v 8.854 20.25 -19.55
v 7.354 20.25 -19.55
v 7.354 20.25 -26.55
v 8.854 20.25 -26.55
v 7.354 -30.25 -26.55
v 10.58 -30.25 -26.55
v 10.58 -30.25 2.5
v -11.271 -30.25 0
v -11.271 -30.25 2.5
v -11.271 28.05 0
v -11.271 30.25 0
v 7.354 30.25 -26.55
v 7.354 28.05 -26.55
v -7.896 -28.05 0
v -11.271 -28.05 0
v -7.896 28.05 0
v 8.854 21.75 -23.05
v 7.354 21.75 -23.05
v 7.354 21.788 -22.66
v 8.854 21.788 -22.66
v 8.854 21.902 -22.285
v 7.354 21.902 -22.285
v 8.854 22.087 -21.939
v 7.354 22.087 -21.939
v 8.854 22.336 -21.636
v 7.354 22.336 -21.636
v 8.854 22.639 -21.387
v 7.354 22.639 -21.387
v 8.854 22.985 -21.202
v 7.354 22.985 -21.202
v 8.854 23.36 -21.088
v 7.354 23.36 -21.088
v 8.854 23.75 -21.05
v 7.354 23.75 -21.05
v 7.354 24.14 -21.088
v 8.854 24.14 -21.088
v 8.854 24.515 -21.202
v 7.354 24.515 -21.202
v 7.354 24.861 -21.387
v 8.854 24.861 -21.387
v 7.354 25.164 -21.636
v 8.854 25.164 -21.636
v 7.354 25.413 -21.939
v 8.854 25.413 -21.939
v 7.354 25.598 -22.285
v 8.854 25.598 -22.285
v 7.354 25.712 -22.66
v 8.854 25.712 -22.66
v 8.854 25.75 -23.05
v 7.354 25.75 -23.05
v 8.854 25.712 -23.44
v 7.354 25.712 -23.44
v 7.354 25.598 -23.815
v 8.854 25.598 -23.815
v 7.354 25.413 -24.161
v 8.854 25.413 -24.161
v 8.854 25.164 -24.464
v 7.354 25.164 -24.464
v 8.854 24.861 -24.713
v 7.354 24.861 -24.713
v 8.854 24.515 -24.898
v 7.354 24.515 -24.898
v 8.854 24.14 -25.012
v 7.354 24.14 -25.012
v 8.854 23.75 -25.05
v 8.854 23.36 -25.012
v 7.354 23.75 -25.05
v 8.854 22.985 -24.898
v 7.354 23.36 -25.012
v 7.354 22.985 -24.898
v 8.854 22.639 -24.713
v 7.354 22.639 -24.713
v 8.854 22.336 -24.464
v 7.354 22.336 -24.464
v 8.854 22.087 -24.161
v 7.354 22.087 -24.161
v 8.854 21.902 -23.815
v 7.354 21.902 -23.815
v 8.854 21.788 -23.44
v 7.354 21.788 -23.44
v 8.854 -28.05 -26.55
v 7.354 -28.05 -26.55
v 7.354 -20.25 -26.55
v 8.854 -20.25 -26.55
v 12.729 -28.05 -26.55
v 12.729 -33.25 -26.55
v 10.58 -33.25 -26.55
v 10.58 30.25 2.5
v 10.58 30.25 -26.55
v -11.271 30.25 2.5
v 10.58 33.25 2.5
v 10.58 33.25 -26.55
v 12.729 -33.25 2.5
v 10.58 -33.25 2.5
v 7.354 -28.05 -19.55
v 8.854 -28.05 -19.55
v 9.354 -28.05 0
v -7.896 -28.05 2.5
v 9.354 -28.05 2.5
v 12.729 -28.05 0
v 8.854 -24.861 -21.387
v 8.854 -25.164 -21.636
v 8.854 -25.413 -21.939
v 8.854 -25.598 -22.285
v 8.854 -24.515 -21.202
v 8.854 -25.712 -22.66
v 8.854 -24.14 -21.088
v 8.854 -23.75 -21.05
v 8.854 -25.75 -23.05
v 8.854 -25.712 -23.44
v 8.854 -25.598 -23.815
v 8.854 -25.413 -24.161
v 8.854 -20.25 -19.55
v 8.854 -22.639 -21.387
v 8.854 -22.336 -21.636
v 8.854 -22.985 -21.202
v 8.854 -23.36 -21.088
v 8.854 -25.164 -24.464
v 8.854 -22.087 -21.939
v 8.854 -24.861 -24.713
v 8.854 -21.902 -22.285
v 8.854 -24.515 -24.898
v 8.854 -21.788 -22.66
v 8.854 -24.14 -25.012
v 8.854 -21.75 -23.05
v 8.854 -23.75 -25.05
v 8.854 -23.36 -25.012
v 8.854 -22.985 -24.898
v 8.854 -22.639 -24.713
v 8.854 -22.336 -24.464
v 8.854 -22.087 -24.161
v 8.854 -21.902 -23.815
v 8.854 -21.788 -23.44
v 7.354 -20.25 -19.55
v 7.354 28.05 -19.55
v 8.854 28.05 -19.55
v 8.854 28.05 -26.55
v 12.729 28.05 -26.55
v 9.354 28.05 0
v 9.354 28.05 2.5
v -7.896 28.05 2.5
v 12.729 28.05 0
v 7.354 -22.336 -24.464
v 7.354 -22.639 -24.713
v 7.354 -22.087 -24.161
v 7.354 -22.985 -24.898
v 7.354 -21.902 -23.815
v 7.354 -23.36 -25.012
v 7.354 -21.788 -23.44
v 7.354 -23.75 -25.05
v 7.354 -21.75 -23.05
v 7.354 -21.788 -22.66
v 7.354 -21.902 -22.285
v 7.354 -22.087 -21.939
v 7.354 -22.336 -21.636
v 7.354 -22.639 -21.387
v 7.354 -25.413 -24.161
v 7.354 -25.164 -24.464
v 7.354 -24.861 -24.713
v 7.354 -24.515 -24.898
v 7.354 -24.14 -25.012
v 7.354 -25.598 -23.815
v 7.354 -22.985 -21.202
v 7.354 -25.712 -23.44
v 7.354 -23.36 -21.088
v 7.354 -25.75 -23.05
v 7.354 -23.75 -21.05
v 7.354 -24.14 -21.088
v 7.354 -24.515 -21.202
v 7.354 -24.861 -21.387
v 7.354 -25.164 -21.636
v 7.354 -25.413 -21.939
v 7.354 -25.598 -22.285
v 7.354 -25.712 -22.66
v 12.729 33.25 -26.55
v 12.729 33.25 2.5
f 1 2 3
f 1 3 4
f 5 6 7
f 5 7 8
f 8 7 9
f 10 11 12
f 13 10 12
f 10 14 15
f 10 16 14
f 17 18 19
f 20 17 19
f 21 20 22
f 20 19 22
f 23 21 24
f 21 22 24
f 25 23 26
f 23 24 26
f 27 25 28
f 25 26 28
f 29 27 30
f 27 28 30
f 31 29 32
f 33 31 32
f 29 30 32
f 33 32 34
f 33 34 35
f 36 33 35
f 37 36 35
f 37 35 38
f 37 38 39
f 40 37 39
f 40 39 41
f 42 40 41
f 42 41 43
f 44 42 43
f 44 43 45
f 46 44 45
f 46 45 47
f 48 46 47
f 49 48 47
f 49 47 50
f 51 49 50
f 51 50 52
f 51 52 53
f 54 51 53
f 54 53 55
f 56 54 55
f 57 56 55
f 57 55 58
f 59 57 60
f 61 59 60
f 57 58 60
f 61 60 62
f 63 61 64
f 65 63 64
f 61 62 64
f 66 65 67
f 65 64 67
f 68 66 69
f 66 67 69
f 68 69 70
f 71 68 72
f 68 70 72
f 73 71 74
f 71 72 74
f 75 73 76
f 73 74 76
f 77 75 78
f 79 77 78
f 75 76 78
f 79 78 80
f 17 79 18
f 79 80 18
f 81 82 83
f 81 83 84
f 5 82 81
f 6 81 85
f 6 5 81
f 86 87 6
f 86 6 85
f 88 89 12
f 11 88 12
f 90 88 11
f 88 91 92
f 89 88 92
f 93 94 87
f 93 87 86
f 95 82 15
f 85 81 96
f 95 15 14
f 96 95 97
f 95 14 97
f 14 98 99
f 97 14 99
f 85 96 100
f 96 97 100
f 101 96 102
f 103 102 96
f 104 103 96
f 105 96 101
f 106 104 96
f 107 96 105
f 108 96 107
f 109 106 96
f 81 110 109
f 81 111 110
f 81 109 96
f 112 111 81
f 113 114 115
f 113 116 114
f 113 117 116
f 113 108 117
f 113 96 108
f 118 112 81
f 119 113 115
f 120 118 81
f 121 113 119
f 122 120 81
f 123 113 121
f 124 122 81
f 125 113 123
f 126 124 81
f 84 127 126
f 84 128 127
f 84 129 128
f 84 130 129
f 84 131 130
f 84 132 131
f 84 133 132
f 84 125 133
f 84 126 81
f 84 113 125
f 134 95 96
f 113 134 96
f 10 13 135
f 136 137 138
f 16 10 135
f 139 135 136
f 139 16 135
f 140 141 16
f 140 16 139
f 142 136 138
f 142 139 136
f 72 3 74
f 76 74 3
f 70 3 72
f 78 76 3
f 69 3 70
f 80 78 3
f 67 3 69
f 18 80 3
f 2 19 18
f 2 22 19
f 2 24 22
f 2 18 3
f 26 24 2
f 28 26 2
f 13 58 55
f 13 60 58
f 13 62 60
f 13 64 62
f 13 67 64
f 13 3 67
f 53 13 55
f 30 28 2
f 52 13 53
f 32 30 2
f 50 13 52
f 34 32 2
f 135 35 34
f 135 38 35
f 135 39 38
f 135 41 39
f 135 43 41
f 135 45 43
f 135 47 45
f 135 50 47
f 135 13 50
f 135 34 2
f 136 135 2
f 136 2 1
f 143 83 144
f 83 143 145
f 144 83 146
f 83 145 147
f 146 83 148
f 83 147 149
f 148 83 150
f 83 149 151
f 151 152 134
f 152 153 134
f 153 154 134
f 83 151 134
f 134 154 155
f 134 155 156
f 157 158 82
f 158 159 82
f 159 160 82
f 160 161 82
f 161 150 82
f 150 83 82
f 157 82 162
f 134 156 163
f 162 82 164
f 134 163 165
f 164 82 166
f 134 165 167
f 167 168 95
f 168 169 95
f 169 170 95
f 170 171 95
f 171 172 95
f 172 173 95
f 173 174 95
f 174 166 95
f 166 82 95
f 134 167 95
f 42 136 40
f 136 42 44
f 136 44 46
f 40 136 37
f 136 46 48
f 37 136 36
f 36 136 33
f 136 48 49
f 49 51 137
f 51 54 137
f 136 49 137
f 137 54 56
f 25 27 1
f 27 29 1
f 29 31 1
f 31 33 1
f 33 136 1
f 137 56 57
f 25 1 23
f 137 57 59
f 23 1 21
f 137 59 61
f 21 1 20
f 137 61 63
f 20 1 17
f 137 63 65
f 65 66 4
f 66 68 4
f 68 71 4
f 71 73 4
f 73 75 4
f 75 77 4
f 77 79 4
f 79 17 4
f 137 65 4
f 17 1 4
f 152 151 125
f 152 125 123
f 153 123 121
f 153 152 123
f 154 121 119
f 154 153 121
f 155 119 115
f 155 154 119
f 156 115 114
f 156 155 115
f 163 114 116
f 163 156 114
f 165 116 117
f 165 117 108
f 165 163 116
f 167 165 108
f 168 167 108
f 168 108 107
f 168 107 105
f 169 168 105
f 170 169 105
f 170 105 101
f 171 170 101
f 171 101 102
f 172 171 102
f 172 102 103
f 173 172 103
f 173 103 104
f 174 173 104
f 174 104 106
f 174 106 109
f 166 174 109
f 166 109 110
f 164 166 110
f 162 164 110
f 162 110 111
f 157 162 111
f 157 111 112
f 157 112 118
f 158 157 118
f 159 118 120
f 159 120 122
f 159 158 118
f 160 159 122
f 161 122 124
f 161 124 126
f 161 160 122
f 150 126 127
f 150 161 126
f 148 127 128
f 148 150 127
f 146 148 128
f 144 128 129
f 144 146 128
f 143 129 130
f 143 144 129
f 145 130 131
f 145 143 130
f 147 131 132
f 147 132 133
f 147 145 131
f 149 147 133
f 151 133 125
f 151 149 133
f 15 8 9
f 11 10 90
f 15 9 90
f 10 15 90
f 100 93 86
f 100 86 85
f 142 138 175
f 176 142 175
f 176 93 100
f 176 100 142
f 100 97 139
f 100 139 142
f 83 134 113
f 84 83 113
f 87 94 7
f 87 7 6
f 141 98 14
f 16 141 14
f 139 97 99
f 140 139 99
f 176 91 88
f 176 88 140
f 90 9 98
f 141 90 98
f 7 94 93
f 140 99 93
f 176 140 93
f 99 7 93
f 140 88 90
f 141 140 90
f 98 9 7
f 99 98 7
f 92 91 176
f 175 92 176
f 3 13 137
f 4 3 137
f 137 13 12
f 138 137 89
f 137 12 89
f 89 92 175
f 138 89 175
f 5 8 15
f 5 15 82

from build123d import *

# Parameters (mm, degrees)
F1_DEPTH  = 2.5
F2_W      = 24
F2_H      = 6
F3_DEPTH  = 26.55
F5_DEPTH  = 33.251
F6_W      = 1.5
F6_H      = 7
F7_DEPTH  = 7
F8_R      = 2
F9_DEPTH  = 25
F11_DEPTH = 3
F12_DEPTH = 0.8


with BuildPart() as f1:
    # F0 (on Top) → F1 (new body)
    with BuildSketch(Plane.XY):
        Polygon((-7.895649, 0), (-7.895649, 27.25), (9.354351, 27.25), (9.354351, 0), (12.729351, 0), (12.729351, 33.25), (-11.270649, 33.25), (-11.270649, 0), align=None)
    extrude(amount=F1_DEPTH)

    # F2 (on face) → F3 (join)
    with BuildSketch(Plane(origin=(0, 0, 0), x_dir=(1, 0, 0), z_dir=(0, 0, -1))):
        with Locations((0.729351, -30.25)):
            Rectangle(F2_W, F2_H)
    extrude(amount=F3_DEPTH)

    # F4 (on face) → F5 (cut, through all)
    with BuildSketch(Plane(origin=(0, 33.25, 0), x_dir=(-1, 0, 0), z_dir=(0, 1, 0))):
        Polygon((11.270649, -26.55), (11.270649, 0), (-7.354351, -26.55), align=None)
    extrude(amount=-F5_DEPTH, mode=Mode.SUBTRACT)

    # F6 (on face) → F7 (join)
    with BuildSketch(Plane.XZ.offset(-27.25)):
        with Locations((8.104351, -23.05)):
            Rectangle(F6_W, F6_H)
    extrude(amount=F7_DEPTH)

    # F8 (on face) → F9 (cut)
    with BuildSketch(Plane(origin=(7.354351, 0, 0), x_dir=(0, -1, 0), z_dir=(-1, 0, 0))):
        with Locations((-23.75, -23.05)):
            Circle(F8_R)
    extrude(amount=-F9_DEPTH, mode=Mode.SUBTRACT)

    # F10 (on face) → F11 (cut)
    with BuildSketch(Plane(origin=(0, 33.25, 0), x_dir=(-1, 0, 0), z_dir=(0, 1, 0))):
        Polygon((-7.354351, -26.55), (11.270649, 0), (11.270649, 2.5), (-10.580134, 2.5), (-10.580134, -26.55), align=None)
    extrude(amount=-F11_DEPTH, mode=Mode.SUBTRACT)

    # F6 (on face) → F12 (cut)
    with BuildSketch(Plane.XZ.offset(-27.25)):
        Polygon((-11.270649, 0), (7.354351, -26.55), (7.354351, -19.55), (8.854351, -19.55), (8.854351, -26.55), (12.729351, -26.55), (12.729351, 0), (9.354351, 0), (9.354351, 2.5), (-7.895649, 2.5), (-7.895649, 0), align=None)
    extrude(amount=-F12_DEPTH, mode=Mode.SUBTRACT)

    # F13: F1 across face


with BuildPart() as f1_1:
    add(f1.part)
    add(f1.part.mirror(Plane(origin=(-9.583149, 0, 1.25), x_dir=(1, 0, 0), z_dir=(0, -1, 0))))


solid = f1_1.part
